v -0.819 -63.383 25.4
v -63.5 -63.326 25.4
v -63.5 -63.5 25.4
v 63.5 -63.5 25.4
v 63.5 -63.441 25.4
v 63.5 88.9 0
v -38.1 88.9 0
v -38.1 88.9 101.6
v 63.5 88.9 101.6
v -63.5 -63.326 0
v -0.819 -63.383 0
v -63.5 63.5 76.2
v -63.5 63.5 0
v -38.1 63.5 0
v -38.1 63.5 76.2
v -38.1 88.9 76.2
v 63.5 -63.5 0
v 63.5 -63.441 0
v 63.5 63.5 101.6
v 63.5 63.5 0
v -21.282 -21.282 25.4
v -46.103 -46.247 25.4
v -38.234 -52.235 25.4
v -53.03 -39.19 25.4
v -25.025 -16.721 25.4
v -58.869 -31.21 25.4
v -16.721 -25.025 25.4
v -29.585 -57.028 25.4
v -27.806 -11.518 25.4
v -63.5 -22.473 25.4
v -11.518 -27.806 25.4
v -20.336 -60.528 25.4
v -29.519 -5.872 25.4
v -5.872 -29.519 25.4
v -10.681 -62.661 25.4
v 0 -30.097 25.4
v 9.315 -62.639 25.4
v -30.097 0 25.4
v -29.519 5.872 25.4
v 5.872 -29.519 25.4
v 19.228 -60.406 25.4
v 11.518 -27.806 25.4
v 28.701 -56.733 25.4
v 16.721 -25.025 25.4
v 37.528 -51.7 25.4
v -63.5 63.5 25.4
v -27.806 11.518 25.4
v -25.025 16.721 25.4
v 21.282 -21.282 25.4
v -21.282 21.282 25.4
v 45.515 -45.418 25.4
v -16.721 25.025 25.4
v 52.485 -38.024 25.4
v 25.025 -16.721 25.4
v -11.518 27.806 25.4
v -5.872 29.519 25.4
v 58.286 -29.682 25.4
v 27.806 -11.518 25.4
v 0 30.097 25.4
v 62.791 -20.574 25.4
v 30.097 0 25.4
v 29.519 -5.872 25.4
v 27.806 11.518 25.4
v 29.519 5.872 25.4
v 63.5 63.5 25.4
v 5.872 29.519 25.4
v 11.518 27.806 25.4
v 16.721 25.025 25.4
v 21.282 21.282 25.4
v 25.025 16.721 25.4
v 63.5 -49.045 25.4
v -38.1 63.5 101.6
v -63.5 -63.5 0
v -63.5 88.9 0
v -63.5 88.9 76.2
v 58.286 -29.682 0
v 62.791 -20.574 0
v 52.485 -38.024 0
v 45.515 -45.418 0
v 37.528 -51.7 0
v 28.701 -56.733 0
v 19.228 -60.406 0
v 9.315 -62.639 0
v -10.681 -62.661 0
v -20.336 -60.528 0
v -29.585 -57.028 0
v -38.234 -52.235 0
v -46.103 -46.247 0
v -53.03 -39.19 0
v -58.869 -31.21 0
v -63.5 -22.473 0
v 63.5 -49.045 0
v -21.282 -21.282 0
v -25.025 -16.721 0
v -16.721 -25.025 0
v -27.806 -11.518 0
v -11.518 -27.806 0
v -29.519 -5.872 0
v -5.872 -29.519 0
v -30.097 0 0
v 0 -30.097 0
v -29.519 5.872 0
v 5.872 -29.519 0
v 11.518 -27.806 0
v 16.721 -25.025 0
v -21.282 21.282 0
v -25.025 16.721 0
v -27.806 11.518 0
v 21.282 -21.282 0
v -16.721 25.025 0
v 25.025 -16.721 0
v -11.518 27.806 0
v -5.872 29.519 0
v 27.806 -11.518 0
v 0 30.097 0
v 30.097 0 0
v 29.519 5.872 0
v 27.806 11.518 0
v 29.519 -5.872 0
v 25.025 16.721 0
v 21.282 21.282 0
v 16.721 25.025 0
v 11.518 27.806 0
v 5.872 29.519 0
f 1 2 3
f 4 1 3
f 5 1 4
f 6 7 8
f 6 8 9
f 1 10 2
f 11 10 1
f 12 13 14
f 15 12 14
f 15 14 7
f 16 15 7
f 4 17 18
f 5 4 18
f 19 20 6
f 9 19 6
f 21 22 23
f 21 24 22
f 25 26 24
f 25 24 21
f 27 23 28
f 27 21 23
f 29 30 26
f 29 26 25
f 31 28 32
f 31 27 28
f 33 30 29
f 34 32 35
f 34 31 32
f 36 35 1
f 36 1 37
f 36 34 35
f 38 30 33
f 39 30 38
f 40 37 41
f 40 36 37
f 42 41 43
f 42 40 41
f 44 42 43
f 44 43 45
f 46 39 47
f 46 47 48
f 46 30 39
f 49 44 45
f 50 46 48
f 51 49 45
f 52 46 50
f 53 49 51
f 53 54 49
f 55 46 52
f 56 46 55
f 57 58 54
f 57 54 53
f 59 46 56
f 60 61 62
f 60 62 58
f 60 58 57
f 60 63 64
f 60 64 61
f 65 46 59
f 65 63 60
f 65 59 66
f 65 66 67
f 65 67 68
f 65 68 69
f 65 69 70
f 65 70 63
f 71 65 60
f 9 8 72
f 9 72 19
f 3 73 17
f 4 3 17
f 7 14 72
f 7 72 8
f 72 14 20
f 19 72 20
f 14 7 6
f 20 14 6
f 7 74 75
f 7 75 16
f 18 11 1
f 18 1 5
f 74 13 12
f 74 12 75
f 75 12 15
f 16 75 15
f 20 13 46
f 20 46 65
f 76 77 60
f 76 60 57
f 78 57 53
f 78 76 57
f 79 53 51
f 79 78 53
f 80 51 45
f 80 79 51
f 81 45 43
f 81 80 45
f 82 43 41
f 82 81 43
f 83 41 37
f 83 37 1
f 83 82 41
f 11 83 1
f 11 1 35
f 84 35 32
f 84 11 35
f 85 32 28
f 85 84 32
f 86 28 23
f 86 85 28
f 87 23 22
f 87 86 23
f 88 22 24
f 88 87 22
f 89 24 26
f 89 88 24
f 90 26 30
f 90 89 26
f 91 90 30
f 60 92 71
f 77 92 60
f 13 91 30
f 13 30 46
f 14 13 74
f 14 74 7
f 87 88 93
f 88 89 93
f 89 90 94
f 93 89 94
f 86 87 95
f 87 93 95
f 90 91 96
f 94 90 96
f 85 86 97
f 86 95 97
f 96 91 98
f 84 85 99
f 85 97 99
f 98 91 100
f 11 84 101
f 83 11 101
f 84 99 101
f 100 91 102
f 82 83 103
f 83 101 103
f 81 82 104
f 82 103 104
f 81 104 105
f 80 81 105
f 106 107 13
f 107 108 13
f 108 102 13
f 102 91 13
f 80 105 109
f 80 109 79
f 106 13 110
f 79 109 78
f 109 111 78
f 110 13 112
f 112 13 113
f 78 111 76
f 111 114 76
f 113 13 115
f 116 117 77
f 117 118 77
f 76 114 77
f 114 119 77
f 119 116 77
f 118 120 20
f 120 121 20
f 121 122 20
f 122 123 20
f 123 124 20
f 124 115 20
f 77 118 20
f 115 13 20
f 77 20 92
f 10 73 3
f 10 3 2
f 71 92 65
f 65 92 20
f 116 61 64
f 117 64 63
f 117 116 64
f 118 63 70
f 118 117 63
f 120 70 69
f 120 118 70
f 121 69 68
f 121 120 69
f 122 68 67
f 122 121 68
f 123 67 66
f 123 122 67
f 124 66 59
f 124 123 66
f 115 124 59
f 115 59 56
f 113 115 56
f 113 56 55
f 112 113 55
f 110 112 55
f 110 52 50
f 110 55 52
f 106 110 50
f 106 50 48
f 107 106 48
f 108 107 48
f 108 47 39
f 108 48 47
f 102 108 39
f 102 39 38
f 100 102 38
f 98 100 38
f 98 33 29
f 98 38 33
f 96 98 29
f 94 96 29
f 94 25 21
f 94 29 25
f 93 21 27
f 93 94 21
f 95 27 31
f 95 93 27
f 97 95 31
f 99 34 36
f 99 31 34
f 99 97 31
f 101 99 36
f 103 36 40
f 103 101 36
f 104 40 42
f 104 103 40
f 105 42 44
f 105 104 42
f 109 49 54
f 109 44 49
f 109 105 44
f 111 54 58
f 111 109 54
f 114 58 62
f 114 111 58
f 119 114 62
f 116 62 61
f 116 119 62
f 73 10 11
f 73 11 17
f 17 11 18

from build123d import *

# Parameters (mm, degrees)
F0_W     = 127
F0_H     = 127
F1_DEPTH = 25.4
F2_R     = 30.096866
F3_DEPTH = 50.8
F5_DEPTH = 50.8
F6_W     = 25.4
F6_H     = 25.4
F7_DEPTH = 76.2
F8_W     = 101.6
F8_H     = 25.4
F9_DEPTH = 101.6


with BuildPart() as f1:
    # F0 (on Top) → F1 (new body)
    with BuildSketch(Plane.XY):
        Rectangle(F0_W, F0_H)
    extrude(amount=F1_DEPTH)

    # F2 (on Top) → F3 (cut)
    with BuildSketch(Plane.XY):
        Circle(F2_R)
    extrude(amount=F3_DEPTH, mode=Mode.SUBTRACT)

    # F4 (on Top) → F5 (cut)
    with BuildSketch(Plane.XY):
        with BuildLine():
            ThreePointArc((62.790878, -20.574031), (37.528447, -51.69982), (-0.818835, -63.382763))
            Line((-0.818835, -63.382763), (63.858583, -63.441748))
            Line((63.858583, -63.441748), (62.790878, -20.574031))
        make_face()
        with BuildLine():
            ThreePointArc((-0.818835, -63.382763), (-38.611796, -51.986363), (-63.859664, -21.642813))
            Line((-63.859664, -21.642813), (-63.859664, -63.325271))
            Line((-63.859664, -63.325271), (-0.818835, -63.382763))
        make_face()
    extrude(amount=F5_DEPTH, mode=Mode.SUBTRACT)


with BuildPart() as f7:
    # F6 (on Top) → F7 (new body)
    with BuildSketch(Plane.XY):
        with Locations((-50.8, 76.2)):
            Rectangle(F6_W, F6_H)
    extrude(amount=F7_DEPTH)


with BuildPart() as f9:
    # F8 (on Top) → F9 (new body)
    with BuildSketch(Plane.XY):
        with Locations((12.7, 76.2)):
            Rectangle(F8_W, F8_H)
    extrude(amount=F9_DEPTH)


solid = Compound([f1.part, f7.part, f9.part])
